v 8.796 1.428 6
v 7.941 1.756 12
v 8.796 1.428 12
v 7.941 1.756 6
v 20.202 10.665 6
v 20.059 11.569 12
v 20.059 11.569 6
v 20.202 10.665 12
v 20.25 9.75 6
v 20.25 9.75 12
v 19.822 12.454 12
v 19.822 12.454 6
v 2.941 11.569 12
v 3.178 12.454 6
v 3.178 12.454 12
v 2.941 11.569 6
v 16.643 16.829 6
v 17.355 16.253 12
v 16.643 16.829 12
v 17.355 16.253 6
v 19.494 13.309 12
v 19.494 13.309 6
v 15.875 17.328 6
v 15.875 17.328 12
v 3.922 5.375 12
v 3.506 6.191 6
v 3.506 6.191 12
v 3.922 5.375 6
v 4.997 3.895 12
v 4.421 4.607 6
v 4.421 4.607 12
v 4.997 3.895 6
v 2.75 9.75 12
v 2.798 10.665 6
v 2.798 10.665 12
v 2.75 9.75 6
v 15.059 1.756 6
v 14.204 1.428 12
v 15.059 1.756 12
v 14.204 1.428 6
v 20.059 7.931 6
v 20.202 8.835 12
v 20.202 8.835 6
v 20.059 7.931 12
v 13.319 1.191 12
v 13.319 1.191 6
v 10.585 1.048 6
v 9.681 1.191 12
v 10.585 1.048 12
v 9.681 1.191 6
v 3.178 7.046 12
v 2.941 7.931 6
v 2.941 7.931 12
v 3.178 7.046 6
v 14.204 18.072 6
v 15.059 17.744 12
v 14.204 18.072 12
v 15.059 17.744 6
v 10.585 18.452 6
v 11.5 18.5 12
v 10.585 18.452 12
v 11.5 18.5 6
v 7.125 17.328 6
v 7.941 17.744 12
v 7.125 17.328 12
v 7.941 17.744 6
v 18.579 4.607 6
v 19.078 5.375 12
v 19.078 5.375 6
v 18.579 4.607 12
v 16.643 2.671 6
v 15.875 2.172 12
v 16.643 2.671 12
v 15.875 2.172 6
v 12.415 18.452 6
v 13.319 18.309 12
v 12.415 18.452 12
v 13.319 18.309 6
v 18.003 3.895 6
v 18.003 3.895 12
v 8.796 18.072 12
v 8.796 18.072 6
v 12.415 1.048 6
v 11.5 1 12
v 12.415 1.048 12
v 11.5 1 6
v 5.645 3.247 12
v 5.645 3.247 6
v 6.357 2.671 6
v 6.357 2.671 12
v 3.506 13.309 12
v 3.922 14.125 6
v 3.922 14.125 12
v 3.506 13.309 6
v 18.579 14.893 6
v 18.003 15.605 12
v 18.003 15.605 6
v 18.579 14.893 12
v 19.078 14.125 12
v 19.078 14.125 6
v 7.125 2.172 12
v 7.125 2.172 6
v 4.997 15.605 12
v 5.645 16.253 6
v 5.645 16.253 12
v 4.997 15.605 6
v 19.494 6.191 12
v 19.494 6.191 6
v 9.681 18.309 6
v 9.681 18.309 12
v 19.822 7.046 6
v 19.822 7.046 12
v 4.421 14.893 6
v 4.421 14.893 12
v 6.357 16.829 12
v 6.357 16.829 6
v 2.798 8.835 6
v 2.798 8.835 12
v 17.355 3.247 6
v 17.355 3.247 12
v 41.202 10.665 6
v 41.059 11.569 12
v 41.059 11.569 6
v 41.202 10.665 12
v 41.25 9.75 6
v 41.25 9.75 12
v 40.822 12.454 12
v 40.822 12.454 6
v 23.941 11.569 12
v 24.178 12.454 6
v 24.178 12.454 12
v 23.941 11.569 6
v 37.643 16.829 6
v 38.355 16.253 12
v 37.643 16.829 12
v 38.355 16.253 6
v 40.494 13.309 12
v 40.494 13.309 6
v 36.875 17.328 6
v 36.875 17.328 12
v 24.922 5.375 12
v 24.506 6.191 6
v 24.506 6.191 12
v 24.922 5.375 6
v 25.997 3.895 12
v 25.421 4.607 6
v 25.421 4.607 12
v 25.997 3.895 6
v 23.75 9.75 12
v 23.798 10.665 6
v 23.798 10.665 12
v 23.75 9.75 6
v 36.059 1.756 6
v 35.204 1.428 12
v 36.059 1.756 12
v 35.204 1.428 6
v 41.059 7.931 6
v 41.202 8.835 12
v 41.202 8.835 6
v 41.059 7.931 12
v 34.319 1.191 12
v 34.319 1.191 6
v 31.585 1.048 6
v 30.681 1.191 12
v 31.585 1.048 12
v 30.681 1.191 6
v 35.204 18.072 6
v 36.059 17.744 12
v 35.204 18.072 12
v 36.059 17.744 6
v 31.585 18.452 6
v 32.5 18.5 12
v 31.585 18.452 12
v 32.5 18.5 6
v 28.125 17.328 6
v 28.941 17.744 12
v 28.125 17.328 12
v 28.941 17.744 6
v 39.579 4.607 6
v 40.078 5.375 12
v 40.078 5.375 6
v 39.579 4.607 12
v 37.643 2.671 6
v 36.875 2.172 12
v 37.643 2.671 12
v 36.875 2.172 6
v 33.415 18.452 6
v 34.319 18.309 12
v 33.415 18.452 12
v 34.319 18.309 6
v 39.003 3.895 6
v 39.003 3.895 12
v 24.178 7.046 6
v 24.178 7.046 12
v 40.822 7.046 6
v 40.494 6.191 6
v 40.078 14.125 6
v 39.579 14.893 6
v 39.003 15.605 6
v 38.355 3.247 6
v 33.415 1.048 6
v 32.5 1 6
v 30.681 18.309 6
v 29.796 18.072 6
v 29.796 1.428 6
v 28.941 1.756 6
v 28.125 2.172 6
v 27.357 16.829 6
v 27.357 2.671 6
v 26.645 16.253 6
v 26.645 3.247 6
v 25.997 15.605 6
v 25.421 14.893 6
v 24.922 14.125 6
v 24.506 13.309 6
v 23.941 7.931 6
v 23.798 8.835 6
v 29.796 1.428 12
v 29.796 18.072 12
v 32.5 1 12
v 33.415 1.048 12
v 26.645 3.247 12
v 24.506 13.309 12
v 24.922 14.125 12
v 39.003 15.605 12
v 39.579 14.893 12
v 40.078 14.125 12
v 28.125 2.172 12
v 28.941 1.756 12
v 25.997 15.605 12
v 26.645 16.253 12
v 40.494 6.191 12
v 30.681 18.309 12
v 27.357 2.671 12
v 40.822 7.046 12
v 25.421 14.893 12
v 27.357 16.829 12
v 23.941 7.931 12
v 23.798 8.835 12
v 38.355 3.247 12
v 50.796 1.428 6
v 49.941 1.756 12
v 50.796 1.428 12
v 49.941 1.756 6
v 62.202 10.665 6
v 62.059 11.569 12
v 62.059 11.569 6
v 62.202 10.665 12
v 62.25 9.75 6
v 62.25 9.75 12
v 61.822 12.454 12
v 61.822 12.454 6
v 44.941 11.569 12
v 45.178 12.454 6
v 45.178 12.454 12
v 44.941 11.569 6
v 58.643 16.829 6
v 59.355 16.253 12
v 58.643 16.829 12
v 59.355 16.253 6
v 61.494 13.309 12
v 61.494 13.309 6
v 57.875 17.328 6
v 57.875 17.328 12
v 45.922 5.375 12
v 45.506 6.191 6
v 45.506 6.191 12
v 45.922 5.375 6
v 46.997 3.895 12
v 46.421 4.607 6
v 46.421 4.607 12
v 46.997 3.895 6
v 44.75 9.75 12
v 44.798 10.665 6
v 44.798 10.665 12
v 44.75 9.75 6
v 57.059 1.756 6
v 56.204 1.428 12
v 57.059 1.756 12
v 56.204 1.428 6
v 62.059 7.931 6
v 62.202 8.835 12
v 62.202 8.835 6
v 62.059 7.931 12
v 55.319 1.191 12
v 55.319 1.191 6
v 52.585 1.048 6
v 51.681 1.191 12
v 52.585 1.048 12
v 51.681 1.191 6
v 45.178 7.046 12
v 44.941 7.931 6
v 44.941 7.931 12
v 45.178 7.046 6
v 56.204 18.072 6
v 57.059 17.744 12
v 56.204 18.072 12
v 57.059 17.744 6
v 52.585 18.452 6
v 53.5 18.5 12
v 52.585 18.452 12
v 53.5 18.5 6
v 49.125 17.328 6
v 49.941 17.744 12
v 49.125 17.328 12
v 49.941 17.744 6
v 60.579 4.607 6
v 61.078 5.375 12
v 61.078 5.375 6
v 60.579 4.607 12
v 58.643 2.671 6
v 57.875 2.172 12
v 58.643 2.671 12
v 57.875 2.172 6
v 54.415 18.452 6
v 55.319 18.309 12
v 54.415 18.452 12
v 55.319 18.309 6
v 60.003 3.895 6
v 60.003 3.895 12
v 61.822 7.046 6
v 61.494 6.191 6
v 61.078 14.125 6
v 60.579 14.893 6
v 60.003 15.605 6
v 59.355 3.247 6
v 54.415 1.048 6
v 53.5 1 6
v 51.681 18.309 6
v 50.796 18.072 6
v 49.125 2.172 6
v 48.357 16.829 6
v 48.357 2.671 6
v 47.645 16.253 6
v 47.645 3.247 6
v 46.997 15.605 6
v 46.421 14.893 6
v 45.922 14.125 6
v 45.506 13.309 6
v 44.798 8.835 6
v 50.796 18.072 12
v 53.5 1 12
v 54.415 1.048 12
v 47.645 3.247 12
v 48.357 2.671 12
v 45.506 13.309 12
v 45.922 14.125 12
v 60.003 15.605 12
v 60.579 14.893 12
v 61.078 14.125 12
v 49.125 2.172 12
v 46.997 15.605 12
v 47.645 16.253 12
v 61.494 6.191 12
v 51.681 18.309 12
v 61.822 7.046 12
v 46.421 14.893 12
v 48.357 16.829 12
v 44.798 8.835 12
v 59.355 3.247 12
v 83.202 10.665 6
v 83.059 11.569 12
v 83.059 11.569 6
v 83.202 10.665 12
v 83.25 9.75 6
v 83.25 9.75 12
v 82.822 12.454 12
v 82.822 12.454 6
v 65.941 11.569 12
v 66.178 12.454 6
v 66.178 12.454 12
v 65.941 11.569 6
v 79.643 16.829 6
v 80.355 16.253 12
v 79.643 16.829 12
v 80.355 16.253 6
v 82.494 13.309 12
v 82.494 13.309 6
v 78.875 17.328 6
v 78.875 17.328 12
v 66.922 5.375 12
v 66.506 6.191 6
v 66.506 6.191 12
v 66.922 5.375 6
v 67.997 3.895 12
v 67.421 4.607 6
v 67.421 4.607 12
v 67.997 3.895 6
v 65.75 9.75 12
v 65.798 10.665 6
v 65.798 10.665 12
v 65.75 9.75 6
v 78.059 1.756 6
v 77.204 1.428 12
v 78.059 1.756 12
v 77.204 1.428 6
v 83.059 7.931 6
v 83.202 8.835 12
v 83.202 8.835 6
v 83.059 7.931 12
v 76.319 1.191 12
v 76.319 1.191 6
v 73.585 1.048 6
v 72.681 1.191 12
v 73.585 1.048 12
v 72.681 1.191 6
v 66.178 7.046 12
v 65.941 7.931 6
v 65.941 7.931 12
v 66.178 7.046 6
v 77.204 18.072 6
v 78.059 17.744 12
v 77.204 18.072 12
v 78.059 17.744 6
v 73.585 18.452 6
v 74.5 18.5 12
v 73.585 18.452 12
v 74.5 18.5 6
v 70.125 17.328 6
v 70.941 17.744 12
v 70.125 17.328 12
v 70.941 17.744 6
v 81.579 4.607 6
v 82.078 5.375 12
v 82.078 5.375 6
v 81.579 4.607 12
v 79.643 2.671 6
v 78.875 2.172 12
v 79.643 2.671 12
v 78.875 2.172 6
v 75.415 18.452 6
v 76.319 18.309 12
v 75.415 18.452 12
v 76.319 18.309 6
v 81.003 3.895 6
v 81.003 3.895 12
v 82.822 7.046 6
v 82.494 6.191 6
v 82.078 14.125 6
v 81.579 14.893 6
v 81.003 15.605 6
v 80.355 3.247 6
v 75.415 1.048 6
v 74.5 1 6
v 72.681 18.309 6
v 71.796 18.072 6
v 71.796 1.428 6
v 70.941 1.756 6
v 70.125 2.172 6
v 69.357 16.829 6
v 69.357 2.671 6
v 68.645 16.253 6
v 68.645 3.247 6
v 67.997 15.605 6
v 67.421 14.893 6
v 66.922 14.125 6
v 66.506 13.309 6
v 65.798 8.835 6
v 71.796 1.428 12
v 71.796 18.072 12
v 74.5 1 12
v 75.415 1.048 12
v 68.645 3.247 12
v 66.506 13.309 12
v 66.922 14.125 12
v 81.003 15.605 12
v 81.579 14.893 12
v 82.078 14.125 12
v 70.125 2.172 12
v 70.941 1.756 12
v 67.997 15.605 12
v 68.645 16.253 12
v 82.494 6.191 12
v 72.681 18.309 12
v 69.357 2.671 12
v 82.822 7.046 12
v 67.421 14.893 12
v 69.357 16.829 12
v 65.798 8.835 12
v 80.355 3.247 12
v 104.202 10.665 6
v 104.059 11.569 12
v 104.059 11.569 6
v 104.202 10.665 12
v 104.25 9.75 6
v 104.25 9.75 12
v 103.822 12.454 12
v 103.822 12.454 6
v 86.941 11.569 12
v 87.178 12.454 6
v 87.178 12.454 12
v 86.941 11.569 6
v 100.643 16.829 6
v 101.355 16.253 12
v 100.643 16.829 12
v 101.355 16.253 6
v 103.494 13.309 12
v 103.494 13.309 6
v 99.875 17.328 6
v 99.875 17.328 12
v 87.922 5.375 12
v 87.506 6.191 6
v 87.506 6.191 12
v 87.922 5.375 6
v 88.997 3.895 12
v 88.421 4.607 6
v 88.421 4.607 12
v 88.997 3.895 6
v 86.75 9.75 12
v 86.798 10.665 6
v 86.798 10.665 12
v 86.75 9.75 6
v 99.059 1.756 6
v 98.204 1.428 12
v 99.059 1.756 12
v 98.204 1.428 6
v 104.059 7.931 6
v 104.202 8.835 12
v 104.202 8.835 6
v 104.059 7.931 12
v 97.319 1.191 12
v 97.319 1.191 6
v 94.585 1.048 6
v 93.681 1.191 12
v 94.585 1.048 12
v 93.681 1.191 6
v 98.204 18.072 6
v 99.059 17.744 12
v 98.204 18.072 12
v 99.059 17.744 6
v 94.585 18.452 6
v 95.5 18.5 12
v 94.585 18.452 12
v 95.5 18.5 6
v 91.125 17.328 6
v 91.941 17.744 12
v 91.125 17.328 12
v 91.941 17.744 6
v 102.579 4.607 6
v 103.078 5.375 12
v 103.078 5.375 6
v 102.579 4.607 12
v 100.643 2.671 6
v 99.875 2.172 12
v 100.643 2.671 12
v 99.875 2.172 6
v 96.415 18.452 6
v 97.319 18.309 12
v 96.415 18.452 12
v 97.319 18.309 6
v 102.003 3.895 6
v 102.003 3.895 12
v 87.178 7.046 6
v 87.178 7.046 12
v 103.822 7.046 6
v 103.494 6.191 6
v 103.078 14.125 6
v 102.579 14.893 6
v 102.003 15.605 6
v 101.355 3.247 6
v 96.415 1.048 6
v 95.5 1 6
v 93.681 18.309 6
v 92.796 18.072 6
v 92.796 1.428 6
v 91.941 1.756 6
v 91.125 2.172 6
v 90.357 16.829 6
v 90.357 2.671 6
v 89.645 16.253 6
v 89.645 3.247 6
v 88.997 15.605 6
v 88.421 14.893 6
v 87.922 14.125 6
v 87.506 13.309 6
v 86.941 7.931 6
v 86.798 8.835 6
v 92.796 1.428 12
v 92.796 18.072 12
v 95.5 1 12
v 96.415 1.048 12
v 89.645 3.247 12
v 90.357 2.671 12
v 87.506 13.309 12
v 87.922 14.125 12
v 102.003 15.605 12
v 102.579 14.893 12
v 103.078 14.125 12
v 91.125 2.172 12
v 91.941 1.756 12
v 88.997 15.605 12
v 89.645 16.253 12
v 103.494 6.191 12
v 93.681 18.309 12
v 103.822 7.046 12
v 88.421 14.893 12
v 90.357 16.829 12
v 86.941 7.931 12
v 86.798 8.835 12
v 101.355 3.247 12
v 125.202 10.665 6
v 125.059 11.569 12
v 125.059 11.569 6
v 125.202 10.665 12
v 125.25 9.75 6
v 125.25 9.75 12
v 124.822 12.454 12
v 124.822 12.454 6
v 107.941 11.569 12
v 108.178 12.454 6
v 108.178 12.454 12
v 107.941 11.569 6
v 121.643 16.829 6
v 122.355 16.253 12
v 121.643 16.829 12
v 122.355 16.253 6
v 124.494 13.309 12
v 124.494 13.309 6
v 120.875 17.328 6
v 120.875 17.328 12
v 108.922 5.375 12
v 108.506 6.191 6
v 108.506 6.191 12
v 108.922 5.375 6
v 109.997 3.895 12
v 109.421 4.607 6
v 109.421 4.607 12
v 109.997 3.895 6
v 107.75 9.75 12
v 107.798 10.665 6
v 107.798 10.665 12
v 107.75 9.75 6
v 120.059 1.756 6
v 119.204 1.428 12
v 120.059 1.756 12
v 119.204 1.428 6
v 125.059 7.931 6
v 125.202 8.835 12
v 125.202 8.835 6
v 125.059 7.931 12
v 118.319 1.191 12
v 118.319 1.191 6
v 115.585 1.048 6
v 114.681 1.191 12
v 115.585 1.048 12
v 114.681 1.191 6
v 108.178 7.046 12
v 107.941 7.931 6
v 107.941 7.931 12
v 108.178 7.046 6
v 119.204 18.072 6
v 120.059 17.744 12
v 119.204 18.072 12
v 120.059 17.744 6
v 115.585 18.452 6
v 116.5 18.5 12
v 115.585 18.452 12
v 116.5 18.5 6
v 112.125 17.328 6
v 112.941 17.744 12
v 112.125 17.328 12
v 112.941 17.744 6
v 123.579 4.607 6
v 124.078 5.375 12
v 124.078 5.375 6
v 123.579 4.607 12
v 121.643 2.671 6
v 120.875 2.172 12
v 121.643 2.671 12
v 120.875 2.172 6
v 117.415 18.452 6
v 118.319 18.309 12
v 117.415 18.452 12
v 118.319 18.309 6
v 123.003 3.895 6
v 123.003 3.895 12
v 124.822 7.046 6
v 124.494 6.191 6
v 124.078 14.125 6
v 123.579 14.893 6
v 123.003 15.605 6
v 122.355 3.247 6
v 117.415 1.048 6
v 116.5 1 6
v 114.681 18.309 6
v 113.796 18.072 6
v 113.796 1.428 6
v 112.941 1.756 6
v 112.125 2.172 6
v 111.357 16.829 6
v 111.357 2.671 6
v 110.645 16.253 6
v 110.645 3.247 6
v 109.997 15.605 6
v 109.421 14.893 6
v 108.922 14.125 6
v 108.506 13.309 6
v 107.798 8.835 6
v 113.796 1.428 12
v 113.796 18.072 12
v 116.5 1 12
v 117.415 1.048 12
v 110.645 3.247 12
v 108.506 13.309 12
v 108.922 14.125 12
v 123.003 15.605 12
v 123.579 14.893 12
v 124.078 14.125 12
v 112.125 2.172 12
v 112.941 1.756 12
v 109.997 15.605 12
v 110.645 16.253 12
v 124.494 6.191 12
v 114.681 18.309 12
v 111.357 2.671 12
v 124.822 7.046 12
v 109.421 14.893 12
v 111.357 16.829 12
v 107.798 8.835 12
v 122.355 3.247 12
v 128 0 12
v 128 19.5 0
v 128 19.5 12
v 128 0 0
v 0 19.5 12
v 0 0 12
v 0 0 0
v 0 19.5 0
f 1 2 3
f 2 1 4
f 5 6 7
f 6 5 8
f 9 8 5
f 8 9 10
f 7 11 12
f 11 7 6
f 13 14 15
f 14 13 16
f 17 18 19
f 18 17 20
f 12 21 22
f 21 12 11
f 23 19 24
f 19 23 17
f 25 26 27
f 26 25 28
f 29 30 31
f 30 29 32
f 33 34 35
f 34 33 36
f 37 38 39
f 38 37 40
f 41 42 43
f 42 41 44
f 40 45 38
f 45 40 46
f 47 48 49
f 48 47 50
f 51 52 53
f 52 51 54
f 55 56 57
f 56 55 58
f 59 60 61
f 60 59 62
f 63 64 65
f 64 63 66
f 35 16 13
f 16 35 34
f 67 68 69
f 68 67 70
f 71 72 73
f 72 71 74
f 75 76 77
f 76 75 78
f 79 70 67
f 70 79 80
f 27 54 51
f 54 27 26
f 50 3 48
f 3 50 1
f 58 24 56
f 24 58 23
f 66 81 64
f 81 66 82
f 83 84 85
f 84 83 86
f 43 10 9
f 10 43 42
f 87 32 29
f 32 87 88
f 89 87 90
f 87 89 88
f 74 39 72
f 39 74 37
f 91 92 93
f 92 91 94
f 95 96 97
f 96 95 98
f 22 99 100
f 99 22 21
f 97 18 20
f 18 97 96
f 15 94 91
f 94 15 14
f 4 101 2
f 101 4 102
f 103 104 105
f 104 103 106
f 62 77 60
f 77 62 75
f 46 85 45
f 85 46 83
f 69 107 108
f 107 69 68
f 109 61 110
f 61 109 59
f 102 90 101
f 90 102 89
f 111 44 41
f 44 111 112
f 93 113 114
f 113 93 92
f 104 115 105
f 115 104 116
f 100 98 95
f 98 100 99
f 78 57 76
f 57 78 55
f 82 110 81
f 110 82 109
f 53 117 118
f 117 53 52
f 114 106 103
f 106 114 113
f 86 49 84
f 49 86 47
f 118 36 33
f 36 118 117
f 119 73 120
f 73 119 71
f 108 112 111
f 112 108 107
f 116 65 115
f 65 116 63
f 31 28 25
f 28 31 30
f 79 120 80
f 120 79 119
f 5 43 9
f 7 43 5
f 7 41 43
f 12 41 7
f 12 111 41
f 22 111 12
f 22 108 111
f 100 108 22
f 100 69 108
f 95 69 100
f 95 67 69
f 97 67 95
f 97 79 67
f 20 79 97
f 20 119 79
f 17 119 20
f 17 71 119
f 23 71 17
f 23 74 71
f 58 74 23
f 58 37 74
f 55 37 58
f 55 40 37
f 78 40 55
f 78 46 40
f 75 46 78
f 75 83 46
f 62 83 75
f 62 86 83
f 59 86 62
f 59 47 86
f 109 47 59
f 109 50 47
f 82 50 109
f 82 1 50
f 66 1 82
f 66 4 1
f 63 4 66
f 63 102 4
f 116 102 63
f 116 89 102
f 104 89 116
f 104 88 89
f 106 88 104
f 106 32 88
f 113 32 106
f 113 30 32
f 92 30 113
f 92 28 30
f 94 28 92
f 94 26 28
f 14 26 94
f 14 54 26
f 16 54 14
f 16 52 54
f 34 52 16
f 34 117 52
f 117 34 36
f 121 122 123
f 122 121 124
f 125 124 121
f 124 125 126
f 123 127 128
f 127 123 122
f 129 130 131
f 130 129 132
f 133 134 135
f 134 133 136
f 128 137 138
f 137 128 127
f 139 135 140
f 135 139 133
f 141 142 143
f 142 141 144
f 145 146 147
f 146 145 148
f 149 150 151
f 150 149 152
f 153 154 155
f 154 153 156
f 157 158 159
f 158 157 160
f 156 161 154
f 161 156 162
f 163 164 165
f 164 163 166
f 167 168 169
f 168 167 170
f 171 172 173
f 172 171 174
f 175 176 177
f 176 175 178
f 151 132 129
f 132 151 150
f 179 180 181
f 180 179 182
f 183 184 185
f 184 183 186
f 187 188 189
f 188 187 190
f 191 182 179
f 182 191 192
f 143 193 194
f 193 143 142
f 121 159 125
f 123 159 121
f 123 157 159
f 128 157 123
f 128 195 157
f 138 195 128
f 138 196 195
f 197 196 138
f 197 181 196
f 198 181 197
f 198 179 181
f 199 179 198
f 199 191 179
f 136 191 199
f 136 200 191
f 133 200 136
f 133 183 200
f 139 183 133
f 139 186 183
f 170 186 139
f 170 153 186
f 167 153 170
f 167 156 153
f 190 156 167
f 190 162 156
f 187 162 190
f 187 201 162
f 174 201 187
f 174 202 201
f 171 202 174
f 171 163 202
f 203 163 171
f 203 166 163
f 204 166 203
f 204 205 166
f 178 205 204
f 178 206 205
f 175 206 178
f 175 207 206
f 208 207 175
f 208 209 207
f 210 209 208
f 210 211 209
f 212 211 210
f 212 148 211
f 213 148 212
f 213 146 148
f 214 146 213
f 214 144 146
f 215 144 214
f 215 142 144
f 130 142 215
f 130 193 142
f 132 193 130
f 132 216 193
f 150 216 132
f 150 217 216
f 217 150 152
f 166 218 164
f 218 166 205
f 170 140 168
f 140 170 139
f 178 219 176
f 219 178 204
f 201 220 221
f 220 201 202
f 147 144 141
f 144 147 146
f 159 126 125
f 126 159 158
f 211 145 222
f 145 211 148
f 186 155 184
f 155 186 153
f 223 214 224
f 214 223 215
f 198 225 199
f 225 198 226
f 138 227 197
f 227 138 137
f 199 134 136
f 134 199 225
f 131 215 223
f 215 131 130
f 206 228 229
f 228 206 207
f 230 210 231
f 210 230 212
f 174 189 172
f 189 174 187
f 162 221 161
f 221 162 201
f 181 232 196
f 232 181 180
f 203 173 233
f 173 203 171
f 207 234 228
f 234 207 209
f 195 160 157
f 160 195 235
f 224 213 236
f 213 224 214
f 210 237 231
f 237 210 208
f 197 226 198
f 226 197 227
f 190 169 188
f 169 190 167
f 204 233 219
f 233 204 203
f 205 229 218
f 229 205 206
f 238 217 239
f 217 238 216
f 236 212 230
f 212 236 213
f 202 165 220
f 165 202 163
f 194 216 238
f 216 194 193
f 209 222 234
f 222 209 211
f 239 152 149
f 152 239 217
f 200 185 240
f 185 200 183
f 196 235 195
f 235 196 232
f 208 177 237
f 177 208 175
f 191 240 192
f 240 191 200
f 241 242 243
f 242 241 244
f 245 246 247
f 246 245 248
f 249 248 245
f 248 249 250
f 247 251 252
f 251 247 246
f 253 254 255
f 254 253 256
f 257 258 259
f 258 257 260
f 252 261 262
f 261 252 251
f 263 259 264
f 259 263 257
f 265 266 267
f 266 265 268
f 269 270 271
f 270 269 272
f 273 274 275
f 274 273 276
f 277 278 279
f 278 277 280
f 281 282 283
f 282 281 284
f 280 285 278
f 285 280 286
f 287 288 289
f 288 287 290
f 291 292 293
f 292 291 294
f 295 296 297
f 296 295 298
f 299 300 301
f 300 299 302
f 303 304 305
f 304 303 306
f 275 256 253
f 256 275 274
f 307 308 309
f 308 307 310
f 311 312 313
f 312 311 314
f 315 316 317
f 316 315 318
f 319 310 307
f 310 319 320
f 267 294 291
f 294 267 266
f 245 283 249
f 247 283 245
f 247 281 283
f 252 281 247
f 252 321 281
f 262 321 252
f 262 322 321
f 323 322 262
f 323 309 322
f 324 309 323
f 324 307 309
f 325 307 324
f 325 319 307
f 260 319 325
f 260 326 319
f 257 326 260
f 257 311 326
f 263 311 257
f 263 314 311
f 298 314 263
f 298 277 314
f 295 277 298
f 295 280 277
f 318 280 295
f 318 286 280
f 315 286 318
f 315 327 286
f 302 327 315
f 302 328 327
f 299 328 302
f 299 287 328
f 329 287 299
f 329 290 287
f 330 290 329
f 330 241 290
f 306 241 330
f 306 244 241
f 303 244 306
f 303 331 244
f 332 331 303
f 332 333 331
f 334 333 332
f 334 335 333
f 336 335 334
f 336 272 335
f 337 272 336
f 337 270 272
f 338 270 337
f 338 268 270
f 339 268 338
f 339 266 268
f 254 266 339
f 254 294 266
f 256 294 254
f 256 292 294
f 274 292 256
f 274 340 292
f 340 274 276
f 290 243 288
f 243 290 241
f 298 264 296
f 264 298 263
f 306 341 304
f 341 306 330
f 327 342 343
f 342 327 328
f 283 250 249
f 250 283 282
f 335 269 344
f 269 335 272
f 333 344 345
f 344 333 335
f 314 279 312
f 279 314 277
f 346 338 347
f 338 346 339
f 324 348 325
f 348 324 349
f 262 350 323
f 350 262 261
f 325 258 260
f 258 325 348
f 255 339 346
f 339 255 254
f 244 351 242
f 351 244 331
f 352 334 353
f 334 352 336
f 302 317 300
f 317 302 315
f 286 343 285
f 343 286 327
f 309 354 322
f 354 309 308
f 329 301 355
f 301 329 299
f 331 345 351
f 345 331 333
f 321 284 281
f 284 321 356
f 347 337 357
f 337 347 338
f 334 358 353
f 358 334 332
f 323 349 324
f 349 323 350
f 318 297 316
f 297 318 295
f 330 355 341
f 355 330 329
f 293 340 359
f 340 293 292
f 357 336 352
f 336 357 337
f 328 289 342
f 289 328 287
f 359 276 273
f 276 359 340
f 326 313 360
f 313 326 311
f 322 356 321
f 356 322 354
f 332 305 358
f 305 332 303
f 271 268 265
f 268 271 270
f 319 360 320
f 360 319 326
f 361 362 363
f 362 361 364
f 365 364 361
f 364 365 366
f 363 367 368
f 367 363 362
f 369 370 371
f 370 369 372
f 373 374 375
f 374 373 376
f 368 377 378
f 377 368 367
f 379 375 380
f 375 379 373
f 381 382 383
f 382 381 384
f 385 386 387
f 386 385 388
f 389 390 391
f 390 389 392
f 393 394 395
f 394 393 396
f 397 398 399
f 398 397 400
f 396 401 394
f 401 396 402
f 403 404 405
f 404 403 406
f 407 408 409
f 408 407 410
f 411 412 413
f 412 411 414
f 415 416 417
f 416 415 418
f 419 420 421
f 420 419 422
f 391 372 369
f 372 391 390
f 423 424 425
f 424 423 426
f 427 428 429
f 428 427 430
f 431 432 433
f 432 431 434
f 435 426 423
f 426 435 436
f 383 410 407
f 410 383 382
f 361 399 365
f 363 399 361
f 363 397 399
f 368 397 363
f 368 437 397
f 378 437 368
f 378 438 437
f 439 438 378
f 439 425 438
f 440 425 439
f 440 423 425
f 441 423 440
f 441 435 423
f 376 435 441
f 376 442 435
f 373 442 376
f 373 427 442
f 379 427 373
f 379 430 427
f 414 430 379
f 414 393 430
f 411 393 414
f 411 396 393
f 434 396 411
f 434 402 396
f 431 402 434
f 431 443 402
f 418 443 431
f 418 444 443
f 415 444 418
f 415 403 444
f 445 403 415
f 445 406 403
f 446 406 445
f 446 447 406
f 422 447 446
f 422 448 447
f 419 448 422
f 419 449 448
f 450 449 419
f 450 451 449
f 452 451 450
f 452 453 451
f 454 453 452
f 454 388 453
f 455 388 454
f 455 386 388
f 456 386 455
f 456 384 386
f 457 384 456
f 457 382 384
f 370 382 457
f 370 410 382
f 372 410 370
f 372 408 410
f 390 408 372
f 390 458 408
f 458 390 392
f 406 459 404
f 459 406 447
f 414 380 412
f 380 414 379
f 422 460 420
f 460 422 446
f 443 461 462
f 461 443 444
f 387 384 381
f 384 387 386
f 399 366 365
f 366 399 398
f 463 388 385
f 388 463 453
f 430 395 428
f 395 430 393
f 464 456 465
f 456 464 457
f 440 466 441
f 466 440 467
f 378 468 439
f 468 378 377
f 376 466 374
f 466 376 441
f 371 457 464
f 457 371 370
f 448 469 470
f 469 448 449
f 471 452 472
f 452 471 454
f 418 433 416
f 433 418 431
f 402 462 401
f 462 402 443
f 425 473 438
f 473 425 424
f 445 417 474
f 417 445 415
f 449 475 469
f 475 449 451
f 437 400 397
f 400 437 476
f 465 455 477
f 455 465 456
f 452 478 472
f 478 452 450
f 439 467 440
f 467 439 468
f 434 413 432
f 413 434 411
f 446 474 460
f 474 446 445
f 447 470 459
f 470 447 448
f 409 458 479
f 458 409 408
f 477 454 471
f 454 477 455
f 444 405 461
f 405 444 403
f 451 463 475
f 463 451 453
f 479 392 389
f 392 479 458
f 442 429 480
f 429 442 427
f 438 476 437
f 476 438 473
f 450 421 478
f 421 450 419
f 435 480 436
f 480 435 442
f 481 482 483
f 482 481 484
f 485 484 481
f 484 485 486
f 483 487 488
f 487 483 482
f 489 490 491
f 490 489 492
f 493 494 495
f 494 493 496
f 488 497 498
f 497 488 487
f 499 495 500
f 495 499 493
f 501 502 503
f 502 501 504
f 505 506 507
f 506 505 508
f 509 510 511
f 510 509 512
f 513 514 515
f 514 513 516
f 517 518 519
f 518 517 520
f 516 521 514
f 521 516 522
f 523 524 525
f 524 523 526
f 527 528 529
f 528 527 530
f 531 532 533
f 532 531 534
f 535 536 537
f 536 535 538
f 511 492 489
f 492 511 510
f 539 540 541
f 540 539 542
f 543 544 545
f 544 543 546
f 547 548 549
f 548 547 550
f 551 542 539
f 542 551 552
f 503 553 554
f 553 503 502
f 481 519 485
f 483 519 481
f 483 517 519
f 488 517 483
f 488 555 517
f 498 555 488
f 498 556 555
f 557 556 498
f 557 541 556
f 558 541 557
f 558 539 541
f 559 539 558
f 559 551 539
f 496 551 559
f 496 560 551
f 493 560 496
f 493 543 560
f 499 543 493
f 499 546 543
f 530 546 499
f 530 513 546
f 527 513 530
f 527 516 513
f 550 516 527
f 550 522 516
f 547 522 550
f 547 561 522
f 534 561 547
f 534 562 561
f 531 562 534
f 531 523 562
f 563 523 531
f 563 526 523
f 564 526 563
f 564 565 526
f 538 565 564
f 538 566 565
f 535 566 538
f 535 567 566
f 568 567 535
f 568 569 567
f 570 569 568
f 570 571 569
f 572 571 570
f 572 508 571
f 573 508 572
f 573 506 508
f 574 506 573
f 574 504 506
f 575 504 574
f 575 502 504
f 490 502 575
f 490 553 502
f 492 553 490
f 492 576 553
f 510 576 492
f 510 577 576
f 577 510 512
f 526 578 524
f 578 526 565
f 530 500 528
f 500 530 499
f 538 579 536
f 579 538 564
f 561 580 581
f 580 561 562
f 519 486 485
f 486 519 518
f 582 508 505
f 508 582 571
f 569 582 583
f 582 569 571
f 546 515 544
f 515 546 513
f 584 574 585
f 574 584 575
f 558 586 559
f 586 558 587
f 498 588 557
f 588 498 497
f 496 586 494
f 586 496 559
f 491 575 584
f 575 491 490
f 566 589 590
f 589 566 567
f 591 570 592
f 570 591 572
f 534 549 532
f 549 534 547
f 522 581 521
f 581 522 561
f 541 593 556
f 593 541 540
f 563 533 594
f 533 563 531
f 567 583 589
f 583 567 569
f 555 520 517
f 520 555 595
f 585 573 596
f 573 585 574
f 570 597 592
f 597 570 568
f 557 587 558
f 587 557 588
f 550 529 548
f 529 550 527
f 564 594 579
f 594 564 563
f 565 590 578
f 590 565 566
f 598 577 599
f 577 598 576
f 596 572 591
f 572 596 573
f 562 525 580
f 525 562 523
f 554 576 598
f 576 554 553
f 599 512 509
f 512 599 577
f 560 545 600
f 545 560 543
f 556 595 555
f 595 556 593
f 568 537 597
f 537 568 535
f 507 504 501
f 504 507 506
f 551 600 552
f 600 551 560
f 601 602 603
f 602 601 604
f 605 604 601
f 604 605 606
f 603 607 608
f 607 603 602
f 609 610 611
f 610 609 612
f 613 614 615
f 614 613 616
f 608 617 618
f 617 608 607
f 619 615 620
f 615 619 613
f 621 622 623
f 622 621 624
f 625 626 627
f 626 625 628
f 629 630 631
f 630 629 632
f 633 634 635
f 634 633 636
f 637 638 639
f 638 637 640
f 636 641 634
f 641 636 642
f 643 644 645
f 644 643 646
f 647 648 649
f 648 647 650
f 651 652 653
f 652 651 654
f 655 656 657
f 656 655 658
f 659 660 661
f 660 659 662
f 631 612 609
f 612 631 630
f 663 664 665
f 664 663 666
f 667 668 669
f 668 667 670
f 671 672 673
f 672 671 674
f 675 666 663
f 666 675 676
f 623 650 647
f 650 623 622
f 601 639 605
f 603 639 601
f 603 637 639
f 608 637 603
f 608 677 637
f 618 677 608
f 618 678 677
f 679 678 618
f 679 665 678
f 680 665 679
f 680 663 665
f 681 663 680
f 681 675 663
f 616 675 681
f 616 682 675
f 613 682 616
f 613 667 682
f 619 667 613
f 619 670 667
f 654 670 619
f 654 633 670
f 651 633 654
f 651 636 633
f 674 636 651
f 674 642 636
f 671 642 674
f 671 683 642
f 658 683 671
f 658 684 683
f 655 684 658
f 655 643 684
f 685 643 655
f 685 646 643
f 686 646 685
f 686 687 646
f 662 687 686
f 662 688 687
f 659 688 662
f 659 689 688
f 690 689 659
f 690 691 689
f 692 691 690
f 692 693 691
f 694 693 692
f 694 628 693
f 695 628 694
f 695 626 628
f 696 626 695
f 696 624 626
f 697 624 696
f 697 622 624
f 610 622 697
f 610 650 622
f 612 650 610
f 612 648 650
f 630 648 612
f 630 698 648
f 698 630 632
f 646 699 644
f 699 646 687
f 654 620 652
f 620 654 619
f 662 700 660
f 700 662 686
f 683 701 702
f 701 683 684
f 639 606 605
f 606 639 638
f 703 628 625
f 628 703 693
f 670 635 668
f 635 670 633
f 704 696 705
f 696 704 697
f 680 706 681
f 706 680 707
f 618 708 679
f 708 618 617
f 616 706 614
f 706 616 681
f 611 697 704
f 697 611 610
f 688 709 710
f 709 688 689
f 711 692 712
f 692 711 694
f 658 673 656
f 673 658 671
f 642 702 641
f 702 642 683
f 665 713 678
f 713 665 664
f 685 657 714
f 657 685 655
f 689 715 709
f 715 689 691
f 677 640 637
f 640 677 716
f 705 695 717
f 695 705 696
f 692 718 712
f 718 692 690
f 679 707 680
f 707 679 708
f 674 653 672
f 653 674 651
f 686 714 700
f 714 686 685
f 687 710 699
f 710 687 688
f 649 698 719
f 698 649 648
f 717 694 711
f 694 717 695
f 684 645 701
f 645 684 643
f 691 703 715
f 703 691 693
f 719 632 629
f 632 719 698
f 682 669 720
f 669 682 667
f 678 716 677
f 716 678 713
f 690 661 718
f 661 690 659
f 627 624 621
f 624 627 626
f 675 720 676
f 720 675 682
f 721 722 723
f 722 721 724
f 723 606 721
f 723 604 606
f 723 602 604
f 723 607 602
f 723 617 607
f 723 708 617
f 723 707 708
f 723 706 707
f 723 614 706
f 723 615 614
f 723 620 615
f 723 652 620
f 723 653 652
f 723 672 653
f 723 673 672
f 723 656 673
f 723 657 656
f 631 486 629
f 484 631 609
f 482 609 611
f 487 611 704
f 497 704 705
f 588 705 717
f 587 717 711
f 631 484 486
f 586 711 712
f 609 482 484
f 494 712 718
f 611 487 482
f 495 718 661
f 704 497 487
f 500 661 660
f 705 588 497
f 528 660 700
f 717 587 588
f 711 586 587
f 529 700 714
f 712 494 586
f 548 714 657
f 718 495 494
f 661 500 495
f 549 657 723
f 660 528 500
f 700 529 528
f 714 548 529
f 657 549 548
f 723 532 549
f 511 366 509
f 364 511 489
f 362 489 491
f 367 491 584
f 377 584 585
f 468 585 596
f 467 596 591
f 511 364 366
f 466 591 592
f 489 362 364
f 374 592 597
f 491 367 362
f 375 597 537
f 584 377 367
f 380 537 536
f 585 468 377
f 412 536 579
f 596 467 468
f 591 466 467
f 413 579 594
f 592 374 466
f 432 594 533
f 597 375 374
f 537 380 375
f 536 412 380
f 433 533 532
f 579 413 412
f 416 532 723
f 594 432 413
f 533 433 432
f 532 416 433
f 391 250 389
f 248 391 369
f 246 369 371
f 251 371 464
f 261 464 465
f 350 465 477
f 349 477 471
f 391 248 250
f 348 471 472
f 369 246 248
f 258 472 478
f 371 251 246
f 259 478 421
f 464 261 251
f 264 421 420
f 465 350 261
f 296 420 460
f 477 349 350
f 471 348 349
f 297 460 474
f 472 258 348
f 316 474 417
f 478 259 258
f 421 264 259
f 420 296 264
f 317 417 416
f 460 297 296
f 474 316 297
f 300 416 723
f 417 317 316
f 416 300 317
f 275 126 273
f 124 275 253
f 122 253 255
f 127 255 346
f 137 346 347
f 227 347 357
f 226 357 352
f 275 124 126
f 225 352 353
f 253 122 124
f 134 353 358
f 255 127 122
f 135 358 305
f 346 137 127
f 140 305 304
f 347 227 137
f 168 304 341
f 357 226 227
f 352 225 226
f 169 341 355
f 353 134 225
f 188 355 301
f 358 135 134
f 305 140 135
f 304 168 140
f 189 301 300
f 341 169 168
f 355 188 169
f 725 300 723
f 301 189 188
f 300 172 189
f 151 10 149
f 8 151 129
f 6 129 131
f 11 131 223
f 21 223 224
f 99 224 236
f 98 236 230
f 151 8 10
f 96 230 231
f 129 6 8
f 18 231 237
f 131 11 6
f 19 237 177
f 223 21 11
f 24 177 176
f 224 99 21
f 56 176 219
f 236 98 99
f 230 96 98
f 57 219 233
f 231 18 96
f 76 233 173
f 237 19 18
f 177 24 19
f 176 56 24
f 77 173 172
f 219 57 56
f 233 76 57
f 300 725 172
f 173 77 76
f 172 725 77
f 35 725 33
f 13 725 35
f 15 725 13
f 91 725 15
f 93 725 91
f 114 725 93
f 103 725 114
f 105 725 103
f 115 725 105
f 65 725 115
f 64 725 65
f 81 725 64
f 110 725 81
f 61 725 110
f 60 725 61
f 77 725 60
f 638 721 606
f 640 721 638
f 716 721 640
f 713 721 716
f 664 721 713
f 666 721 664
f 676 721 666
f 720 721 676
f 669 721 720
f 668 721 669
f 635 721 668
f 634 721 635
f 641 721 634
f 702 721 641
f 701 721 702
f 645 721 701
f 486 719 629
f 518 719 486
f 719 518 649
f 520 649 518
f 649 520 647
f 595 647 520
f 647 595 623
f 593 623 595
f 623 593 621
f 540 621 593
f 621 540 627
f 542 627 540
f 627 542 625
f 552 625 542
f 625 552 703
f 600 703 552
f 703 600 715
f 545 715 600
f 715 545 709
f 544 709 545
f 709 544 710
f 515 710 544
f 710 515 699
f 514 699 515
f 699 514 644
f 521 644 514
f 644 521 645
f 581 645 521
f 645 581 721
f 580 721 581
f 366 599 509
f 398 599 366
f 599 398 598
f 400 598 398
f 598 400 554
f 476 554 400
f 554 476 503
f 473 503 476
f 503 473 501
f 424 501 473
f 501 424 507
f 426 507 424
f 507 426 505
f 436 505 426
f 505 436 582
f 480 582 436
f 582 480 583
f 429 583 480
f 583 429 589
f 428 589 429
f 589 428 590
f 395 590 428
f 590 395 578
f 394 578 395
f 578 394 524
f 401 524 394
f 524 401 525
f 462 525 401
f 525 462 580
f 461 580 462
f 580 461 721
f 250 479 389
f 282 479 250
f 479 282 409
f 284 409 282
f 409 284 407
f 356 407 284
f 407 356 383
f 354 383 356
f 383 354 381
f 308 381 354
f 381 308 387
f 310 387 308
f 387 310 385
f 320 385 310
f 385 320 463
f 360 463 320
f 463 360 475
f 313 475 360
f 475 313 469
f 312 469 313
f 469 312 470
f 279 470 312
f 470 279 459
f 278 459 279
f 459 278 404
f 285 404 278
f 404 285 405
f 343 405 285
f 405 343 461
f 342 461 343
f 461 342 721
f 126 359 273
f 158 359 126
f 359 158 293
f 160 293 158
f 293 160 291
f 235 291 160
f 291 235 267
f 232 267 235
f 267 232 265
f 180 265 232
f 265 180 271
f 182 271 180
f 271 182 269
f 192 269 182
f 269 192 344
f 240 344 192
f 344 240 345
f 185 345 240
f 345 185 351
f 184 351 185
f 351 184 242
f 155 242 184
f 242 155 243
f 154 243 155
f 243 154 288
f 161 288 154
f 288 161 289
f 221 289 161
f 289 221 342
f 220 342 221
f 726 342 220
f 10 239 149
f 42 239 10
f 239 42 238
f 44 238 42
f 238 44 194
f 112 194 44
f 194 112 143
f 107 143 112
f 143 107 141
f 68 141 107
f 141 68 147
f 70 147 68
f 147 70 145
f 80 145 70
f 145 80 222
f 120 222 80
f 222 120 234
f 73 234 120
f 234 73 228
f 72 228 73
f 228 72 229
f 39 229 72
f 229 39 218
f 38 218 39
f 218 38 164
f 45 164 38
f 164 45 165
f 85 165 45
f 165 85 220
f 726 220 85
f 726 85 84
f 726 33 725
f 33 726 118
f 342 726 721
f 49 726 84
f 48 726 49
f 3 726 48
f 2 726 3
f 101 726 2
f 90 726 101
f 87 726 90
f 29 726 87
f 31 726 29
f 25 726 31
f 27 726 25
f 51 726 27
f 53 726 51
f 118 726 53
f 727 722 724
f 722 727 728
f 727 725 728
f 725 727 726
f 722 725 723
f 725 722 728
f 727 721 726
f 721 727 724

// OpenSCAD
// Multitubetopper for culture tubes
//
$fn=60;
holediameter=17.5;
holecentertocenter= 21;
numholes=6;
buffer=1;
height=12;
difference(){
    cube(size=[numholes*holecentertocenter+buffer*2,holediameter+2*buffer,height]);
    for (i=[1:numholes]){
        translate([buffer+(i-0.5)*holecentertocenter,buffer+holediameter/2,height/2]){cylinder(h=height,d=holediameter);}}}
